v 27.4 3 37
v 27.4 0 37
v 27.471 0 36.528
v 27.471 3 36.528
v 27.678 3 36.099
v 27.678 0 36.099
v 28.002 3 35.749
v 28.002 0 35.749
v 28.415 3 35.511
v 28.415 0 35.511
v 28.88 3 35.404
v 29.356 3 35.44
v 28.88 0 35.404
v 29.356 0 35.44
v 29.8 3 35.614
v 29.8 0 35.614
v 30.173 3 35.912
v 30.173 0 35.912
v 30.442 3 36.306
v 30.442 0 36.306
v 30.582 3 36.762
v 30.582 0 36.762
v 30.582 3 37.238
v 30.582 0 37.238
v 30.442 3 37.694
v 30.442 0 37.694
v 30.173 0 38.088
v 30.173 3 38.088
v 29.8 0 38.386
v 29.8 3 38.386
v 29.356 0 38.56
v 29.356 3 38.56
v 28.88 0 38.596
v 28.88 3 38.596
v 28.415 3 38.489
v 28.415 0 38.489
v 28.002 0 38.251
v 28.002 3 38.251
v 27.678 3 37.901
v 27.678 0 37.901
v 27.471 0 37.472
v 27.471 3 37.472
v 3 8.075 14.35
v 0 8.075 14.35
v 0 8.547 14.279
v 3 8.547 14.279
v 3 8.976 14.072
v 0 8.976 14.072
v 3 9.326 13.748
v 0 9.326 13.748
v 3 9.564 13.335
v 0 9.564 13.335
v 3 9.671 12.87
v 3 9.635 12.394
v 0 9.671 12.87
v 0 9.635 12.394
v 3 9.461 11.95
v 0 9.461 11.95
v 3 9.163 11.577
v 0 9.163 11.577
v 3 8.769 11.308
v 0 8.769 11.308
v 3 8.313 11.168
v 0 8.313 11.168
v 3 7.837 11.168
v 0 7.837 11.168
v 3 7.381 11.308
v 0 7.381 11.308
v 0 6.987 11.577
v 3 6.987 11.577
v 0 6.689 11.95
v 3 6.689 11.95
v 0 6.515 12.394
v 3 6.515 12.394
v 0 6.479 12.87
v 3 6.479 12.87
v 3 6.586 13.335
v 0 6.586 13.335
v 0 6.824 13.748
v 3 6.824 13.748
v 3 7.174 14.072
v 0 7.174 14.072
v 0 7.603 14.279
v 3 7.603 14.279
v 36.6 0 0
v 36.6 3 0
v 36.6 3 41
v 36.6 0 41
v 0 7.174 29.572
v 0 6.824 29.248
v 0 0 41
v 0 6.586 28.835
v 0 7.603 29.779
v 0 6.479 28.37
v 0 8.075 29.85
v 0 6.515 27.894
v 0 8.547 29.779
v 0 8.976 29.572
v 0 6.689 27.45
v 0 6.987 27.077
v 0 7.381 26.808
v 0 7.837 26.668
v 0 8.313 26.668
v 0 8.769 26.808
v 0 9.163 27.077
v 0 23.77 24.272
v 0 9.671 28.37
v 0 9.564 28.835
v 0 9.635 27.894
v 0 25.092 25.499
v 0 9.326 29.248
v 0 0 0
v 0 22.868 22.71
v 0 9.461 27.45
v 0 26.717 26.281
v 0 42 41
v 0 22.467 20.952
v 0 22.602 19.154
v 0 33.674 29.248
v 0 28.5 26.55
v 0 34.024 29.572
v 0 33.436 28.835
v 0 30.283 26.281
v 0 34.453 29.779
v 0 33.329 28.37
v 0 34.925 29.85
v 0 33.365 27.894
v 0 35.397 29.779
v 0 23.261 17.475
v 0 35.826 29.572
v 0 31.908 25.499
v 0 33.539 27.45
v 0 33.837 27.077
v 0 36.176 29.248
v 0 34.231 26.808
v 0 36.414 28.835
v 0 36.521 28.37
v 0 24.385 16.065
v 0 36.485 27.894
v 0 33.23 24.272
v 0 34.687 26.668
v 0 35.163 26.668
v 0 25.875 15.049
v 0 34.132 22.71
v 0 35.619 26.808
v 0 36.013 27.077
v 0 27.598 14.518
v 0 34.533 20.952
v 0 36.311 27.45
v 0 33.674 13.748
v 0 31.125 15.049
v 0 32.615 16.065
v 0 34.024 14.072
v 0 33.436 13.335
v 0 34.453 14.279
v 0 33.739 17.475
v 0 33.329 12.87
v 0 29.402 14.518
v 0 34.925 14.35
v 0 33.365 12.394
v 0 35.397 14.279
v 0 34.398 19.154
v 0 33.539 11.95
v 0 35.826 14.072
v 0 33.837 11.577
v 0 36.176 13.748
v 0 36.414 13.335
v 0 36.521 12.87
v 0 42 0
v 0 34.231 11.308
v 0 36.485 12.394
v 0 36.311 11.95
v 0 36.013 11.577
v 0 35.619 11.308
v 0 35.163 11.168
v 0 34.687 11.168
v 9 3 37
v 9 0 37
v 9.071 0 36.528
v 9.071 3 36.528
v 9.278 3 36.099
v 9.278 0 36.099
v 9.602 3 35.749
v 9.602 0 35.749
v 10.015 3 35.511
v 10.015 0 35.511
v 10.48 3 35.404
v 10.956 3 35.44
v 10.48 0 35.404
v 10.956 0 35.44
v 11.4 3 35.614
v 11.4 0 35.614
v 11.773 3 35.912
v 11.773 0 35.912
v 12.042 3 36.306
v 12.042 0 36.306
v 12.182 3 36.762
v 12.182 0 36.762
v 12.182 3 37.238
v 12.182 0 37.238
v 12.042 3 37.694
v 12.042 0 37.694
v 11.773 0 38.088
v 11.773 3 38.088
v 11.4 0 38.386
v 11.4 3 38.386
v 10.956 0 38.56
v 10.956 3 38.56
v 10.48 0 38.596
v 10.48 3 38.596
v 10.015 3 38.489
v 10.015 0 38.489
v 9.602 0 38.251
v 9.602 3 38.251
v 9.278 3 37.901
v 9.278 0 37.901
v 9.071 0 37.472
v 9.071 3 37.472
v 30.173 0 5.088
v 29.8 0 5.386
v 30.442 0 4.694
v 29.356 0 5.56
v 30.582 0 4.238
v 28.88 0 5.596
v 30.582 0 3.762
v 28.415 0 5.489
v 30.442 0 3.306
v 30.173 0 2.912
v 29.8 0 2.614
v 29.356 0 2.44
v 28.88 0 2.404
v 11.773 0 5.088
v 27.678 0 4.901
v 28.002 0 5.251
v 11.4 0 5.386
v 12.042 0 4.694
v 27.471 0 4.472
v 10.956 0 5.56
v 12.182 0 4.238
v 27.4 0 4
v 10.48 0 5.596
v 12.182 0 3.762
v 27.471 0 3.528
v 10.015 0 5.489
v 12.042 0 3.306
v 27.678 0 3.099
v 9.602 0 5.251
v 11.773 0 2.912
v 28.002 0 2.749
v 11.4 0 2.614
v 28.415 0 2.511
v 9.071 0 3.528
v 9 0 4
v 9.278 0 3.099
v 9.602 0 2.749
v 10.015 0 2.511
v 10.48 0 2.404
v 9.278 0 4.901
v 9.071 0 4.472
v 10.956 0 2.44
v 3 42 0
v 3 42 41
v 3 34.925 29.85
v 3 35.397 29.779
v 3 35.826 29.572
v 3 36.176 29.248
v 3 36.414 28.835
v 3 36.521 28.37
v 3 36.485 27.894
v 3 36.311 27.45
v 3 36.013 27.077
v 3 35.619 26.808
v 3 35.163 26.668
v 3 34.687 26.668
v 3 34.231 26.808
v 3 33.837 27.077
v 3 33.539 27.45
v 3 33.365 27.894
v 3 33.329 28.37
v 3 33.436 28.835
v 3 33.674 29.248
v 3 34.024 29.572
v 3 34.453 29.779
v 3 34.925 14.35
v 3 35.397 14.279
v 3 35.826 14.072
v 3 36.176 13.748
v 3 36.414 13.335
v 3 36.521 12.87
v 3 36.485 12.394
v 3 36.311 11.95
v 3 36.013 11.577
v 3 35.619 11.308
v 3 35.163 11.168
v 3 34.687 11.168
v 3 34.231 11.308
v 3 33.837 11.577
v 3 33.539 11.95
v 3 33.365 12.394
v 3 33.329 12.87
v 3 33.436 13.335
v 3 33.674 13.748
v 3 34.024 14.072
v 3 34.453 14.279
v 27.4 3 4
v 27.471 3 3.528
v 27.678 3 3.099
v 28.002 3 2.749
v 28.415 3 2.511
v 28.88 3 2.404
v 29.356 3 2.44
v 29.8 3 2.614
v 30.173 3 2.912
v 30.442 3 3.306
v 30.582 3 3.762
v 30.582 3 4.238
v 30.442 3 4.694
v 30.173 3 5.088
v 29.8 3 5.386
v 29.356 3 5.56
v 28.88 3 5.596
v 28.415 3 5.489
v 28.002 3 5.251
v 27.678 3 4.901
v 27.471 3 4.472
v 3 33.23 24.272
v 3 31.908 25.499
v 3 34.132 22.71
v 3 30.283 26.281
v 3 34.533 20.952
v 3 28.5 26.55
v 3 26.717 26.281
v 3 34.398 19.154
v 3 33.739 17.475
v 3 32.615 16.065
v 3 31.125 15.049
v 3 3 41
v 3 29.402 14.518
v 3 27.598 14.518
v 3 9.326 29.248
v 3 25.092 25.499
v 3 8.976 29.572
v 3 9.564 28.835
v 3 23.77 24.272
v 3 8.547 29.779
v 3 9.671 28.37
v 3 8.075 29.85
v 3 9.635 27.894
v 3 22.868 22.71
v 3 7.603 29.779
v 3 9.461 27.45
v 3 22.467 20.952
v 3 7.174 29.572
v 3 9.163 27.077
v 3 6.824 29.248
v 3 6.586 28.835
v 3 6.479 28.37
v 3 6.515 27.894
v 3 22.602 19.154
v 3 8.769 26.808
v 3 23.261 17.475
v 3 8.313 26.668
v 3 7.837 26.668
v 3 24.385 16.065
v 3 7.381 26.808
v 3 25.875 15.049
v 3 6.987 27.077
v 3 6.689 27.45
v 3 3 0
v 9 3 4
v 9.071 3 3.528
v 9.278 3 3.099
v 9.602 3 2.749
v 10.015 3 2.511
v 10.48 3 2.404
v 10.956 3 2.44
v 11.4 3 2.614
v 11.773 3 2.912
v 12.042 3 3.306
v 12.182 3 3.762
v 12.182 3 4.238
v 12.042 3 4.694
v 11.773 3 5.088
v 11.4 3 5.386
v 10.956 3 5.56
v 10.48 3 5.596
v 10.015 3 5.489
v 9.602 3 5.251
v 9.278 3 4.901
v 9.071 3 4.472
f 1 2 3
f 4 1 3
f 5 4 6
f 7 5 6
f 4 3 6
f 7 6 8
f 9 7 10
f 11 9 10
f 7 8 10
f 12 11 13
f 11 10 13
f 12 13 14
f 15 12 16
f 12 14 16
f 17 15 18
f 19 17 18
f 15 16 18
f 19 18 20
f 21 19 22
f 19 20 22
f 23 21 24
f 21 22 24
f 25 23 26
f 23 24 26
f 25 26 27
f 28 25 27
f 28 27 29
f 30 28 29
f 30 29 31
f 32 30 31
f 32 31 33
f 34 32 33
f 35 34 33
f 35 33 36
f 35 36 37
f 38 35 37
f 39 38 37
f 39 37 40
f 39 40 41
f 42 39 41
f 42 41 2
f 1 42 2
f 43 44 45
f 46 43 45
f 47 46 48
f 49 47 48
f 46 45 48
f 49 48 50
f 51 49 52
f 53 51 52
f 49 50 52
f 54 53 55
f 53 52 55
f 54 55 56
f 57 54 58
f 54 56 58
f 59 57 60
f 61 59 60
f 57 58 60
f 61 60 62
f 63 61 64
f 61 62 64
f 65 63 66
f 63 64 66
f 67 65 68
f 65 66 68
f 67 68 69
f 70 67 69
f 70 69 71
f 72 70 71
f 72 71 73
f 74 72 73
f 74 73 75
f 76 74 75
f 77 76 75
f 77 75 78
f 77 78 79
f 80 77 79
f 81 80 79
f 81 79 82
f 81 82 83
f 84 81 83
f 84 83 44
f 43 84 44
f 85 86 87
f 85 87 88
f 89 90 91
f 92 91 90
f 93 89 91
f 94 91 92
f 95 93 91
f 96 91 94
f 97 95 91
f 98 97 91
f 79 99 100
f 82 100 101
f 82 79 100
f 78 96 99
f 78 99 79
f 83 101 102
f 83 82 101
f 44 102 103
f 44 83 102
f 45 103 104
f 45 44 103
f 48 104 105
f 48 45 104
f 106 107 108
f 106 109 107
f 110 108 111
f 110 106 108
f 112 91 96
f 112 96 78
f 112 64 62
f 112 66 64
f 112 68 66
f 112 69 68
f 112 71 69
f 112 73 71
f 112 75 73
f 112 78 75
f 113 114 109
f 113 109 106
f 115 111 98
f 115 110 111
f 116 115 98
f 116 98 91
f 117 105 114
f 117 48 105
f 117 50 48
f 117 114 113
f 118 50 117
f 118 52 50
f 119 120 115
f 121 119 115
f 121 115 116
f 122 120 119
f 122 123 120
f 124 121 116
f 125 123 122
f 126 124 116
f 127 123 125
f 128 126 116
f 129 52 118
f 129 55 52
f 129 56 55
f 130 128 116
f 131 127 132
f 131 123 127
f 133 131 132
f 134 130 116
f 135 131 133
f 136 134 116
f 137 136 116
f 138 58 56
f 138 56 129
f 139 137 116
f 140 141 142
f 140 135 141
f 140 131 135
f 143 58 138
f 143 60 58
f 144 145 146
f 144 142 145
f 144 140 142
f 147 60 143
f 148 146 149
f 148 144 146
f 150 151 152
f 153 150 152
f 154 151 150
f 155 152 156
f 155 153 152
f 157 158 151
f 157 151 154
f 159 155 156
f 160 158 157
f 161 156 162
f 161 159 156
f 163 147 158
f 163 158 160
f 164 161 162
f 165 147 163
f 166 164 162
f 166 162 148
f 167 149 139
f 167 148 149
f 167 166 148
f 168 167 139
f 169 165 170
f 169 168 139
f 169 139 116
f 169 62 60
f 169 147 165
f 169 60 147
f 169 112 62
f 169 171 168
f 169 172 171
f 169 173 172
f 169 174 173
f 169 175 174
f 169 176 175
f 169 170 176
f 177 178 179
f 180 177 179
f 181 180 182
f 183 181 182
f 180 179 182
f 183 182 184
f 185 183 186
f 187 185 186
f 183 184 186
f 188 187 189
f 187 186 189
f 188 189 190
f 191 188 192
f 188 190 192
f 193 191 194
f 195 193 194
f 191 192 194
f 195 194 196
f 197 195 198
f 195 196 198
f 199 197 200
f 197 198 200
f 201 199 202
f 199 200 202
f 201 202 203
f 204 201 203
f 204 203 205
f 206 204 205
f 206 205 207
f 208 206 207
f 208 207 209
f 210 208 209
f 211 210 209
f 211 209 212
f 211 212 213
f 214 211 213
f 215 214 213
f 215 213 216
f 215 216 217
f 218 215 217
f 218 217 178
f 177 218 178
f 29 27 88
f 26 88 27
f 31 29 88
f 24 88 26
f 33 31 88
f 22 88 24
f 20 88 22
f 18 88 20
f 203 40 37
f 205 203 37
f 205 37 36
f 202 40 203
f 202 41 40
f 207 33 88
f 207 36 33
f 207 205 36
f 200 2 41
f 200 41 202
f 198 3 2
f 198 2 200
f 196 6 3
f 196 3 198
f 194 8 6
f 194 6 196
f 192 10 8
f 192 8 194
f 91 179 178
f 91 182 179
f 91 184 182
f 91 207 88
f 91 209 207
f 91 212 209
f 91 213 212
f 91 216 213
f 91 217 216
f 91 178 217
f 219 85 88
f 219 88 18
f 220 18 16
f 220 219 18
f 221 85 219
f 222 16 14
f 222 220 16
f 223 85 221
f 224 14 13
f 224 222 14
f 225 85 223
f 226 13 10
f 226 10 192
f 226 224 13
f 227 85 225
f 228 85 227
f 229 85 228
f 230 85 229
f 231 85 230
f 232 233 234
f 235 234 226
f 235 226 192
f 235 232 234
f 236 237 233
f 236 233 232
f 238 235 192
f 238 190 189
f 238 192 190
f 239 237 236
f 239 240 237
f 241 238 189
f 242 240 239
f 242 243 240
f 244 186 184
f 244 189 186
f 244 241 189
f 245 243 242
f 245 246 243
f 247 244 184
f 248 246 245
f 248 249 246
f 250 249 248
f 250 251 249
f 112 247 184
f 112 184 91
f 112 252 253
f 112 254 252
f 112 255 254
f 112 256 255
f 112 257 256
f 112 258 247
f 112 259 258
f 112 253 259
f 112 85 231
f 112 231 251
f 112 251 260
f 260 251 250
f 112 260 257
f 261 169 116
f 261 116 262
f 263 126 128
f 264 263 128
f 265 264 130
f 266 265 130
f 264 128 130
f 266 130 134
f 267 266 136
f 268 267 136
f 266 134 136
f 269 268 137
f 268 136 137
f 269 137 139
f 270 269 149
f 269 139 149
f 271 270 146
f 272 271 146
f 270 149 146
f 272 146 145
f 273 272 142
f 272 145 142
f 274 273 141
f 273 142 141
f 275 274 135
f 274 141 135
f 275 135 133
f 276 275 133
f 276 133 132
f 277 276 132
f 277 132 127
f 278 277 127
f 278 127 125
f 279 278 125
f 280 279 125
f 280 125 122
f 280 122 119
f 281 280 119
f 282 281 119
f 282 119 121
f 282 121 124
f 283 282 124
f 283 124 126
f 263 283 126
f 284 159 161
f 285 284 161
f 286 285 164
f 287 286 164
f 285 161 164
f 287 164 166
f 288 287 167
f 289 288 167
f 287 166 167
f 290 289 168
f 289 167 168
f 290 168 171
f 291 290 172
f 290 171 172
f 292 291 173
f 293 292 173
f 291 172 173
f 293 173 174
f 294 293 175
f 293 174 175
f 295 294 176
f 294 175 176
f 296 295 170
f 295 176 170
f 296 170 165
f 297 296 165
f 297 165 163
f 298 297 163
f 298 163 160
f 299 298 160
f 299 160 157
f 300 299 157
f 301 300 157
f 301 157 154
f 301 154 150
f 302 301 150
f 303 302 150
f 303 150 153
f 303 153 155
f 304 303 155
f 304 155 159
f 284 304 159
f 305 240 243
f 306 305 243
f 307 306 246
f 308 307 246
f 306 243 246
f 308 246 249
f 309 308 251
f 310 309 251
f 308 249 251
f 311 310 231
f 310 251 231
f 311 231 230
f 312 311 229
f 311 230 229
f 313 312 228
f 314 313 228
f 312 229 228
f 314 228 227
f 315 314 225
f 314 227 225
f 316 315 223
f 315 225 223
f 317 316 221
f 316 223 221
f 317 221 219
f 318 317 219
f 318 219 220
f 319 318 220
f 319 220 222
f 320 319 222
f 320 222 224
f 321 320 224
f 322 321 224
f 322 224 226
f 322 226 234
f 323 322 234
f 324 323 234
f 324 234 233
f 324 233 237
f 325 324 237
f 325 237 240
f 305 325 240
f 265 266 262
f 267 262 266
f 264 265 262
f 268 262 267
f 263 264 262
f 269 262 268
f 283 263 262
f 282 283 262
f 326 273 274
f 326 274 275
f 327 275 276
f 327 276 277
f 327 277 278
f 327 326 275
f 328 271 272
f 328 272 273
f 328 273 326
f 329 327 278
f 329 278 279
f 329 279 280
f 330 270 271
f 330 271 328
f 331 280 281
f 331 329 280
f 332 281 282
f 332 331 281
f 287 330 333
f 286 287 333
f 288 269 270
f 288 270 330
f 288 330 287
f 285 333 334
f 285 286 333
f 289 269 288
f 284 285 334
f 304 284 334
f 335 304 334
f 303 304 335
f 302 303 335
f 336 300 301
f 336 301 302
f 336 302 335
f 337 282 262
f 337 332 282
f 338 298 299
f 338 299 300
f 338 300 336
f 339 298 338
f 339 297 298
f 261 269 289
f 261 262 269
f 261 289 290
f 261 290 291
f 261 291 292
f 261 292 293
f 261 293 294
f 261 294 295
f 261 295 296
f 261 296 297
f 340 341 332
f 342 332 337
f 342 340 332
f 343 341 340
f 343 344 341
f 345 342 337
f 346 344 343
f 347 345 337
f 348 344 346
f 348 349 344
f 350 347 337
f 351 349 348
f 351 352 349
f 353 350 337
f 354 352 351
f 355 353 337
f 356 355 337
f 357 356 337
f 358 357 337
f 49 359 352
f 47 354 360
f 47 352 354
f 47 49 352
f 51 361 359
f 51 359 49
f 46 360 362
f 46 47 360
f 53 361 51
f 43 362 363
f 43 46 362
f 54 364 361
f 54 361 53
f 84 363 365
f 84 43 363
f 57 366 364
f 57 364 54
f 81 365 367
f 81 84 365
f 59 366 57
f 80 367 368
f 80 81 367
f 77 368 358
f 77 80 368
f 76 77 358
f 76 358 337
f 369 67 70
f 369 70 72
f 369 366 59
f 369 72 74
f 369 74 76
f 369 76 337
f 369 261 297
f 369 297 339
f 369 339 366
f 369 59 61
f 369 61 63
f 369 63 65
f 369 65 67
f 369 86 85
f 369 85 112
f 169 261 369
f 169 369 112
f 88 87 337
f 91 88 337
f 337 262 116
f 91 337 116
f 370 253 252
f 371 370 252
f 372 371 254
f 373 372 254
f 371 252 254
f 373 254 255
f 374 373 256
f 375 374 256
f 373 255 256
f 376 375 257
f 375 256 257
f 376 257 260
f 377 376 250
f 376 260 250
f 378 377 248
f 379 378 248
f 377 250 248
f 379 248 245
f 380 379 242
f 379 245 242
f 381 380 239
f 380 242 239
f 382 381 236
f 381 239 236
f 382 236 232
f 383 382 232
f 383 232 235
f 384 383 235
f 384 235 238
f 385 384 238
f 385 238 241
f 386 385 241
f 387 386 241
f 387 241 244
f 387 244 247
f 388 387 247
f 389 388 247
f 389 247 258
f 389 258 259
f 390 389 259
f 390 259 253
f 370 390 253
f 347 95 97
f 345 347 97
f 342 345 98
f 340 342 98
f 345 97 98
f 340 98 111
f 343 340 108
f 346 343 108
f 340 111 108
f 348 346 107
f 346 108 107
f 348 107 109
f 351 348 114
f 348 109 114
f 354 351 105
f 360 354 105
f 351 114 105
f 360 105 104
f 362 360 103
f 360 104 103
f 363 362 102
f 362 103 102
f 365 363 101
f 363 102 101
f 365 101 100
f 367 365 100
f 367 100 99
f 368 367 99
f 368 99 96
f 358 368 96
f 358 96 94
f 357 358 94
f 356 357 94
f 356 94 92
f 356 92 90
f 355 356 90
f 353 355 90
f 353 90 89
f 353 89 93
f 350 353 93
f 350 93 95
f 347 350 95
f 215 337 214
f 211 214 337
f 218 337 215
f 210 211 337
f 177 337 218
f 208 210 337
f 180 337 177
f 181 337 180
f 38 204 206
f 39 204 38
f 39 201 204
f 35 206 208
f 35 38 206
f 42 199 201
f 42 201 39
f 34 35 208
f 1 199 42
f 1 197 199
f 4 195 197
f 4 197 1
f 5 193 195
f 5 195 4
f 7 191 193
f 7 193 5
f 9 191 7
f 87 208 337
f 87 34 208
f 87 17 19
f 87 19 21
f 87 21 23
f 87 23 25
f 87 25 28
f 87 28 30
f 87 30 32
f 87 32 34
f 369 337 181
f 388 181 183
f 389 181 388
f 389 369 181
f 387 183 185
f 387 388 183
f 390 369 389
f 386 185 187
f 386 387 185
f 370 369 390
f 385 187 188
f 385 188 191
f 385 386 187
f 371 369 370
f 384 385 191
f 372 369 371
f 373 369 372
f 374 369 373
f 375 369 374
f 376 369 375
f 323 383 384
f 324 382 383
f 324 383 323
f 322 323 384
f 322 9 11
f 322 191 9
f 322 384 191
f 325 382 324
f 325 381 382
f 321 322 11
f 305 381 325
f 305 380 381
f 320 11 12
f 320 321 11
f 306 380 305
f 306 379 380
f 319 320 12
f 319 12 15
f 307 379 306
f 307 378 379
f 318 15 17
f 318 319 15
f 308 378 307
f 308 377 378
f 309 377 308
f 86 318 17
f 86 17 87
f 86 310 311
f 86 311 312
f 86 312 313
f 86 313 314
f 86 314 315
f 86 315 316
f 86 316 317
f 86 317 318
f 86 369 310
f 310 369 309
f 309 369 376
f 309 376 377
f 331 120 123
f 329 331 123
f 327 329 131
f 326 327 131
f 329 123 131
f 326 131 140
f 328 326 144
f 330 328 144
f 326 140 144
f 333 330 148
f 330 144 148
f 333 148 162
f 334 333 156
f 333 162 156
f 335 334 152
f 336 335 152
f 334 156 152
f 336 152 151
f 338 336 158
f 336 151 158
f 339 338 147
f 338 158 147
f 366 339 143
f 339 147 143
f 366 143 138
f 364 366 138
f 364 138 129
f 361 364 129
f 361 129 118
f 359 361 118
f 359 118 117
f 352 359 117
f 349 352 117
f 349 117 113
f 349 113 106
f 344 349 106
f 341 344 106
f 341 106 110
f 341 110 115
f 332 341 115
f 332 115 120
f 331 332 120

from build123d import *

# Parameters (mm, degrees)
EXTRUDE_1_DEPTH     = 41
SKETCH_2_R          = 6.05
SKETCH_2_R_2        = 1.6
CUT_EXTRUDE_1_DEPTH = 41
SKETCH_3_R          = 1.6
CUT_EXTRUDE_2_DEPTH = 41


with BuildPart() as part:
    # ｽｹｯﾁ1 → ﾎﾞｽ - 押し出し1 (new body)
    with BuildSketch(Plane.XY):
        Polygon((0, 0), (0, 42), (3, 42), (3, 3), (36.6, 3), (36.6, 0), align=None)
    extrude(amount=EXTRUDE_1_DEPTH)

    # ｽｹｯﾁ2 → ｶｯﾄ - 押し出し1 (cut)
    with BuildSketch(Plane.ZY):
        with Locations((20.5, 28.5)):
            Circle(SKETCH_2_R)
        with Locations((28.25, 34.925)):
            Circle(SKETCH_2_R_2)
        with Locations((28.25, 8.075)):
            Circle(SKETCH_2_R_2)
        with Locations((12.75, 8.075)):
            Circle(SKETCH_2_R_2)
        with Locations((12.75, 34.925)):
            Circle(SKETCH_2_R_2)
    extrude(amount=-CUT_EXTRUDE_1_DEPTH, mode=Mode.SUBTRACT)

    # ｽｹｯﾁ3 → ｶｯﾄ - 押し出し2 (cut)
    with BuildSketch(Plane(origin=(0, 0, 0), x_dir=(-1, 0, 0), z_dir=(0, -1, 0))):
        with Locations((-10.6, -37)):
            Circle(SKETCH_3_R)
        with Locations((-10.6, -4)):
            Circle(SKETCH_3_R)
        with Locations((-29, -4)):
            Circle(SKETCH_3_R)
        with Locations((-29, -37)):
            Circle(SKETCH_3_R)
    extrude(amount=-CUT_EXTRUDE_2_DEPTH, mode=Mode.SUBTRACT)


solid = part.part
